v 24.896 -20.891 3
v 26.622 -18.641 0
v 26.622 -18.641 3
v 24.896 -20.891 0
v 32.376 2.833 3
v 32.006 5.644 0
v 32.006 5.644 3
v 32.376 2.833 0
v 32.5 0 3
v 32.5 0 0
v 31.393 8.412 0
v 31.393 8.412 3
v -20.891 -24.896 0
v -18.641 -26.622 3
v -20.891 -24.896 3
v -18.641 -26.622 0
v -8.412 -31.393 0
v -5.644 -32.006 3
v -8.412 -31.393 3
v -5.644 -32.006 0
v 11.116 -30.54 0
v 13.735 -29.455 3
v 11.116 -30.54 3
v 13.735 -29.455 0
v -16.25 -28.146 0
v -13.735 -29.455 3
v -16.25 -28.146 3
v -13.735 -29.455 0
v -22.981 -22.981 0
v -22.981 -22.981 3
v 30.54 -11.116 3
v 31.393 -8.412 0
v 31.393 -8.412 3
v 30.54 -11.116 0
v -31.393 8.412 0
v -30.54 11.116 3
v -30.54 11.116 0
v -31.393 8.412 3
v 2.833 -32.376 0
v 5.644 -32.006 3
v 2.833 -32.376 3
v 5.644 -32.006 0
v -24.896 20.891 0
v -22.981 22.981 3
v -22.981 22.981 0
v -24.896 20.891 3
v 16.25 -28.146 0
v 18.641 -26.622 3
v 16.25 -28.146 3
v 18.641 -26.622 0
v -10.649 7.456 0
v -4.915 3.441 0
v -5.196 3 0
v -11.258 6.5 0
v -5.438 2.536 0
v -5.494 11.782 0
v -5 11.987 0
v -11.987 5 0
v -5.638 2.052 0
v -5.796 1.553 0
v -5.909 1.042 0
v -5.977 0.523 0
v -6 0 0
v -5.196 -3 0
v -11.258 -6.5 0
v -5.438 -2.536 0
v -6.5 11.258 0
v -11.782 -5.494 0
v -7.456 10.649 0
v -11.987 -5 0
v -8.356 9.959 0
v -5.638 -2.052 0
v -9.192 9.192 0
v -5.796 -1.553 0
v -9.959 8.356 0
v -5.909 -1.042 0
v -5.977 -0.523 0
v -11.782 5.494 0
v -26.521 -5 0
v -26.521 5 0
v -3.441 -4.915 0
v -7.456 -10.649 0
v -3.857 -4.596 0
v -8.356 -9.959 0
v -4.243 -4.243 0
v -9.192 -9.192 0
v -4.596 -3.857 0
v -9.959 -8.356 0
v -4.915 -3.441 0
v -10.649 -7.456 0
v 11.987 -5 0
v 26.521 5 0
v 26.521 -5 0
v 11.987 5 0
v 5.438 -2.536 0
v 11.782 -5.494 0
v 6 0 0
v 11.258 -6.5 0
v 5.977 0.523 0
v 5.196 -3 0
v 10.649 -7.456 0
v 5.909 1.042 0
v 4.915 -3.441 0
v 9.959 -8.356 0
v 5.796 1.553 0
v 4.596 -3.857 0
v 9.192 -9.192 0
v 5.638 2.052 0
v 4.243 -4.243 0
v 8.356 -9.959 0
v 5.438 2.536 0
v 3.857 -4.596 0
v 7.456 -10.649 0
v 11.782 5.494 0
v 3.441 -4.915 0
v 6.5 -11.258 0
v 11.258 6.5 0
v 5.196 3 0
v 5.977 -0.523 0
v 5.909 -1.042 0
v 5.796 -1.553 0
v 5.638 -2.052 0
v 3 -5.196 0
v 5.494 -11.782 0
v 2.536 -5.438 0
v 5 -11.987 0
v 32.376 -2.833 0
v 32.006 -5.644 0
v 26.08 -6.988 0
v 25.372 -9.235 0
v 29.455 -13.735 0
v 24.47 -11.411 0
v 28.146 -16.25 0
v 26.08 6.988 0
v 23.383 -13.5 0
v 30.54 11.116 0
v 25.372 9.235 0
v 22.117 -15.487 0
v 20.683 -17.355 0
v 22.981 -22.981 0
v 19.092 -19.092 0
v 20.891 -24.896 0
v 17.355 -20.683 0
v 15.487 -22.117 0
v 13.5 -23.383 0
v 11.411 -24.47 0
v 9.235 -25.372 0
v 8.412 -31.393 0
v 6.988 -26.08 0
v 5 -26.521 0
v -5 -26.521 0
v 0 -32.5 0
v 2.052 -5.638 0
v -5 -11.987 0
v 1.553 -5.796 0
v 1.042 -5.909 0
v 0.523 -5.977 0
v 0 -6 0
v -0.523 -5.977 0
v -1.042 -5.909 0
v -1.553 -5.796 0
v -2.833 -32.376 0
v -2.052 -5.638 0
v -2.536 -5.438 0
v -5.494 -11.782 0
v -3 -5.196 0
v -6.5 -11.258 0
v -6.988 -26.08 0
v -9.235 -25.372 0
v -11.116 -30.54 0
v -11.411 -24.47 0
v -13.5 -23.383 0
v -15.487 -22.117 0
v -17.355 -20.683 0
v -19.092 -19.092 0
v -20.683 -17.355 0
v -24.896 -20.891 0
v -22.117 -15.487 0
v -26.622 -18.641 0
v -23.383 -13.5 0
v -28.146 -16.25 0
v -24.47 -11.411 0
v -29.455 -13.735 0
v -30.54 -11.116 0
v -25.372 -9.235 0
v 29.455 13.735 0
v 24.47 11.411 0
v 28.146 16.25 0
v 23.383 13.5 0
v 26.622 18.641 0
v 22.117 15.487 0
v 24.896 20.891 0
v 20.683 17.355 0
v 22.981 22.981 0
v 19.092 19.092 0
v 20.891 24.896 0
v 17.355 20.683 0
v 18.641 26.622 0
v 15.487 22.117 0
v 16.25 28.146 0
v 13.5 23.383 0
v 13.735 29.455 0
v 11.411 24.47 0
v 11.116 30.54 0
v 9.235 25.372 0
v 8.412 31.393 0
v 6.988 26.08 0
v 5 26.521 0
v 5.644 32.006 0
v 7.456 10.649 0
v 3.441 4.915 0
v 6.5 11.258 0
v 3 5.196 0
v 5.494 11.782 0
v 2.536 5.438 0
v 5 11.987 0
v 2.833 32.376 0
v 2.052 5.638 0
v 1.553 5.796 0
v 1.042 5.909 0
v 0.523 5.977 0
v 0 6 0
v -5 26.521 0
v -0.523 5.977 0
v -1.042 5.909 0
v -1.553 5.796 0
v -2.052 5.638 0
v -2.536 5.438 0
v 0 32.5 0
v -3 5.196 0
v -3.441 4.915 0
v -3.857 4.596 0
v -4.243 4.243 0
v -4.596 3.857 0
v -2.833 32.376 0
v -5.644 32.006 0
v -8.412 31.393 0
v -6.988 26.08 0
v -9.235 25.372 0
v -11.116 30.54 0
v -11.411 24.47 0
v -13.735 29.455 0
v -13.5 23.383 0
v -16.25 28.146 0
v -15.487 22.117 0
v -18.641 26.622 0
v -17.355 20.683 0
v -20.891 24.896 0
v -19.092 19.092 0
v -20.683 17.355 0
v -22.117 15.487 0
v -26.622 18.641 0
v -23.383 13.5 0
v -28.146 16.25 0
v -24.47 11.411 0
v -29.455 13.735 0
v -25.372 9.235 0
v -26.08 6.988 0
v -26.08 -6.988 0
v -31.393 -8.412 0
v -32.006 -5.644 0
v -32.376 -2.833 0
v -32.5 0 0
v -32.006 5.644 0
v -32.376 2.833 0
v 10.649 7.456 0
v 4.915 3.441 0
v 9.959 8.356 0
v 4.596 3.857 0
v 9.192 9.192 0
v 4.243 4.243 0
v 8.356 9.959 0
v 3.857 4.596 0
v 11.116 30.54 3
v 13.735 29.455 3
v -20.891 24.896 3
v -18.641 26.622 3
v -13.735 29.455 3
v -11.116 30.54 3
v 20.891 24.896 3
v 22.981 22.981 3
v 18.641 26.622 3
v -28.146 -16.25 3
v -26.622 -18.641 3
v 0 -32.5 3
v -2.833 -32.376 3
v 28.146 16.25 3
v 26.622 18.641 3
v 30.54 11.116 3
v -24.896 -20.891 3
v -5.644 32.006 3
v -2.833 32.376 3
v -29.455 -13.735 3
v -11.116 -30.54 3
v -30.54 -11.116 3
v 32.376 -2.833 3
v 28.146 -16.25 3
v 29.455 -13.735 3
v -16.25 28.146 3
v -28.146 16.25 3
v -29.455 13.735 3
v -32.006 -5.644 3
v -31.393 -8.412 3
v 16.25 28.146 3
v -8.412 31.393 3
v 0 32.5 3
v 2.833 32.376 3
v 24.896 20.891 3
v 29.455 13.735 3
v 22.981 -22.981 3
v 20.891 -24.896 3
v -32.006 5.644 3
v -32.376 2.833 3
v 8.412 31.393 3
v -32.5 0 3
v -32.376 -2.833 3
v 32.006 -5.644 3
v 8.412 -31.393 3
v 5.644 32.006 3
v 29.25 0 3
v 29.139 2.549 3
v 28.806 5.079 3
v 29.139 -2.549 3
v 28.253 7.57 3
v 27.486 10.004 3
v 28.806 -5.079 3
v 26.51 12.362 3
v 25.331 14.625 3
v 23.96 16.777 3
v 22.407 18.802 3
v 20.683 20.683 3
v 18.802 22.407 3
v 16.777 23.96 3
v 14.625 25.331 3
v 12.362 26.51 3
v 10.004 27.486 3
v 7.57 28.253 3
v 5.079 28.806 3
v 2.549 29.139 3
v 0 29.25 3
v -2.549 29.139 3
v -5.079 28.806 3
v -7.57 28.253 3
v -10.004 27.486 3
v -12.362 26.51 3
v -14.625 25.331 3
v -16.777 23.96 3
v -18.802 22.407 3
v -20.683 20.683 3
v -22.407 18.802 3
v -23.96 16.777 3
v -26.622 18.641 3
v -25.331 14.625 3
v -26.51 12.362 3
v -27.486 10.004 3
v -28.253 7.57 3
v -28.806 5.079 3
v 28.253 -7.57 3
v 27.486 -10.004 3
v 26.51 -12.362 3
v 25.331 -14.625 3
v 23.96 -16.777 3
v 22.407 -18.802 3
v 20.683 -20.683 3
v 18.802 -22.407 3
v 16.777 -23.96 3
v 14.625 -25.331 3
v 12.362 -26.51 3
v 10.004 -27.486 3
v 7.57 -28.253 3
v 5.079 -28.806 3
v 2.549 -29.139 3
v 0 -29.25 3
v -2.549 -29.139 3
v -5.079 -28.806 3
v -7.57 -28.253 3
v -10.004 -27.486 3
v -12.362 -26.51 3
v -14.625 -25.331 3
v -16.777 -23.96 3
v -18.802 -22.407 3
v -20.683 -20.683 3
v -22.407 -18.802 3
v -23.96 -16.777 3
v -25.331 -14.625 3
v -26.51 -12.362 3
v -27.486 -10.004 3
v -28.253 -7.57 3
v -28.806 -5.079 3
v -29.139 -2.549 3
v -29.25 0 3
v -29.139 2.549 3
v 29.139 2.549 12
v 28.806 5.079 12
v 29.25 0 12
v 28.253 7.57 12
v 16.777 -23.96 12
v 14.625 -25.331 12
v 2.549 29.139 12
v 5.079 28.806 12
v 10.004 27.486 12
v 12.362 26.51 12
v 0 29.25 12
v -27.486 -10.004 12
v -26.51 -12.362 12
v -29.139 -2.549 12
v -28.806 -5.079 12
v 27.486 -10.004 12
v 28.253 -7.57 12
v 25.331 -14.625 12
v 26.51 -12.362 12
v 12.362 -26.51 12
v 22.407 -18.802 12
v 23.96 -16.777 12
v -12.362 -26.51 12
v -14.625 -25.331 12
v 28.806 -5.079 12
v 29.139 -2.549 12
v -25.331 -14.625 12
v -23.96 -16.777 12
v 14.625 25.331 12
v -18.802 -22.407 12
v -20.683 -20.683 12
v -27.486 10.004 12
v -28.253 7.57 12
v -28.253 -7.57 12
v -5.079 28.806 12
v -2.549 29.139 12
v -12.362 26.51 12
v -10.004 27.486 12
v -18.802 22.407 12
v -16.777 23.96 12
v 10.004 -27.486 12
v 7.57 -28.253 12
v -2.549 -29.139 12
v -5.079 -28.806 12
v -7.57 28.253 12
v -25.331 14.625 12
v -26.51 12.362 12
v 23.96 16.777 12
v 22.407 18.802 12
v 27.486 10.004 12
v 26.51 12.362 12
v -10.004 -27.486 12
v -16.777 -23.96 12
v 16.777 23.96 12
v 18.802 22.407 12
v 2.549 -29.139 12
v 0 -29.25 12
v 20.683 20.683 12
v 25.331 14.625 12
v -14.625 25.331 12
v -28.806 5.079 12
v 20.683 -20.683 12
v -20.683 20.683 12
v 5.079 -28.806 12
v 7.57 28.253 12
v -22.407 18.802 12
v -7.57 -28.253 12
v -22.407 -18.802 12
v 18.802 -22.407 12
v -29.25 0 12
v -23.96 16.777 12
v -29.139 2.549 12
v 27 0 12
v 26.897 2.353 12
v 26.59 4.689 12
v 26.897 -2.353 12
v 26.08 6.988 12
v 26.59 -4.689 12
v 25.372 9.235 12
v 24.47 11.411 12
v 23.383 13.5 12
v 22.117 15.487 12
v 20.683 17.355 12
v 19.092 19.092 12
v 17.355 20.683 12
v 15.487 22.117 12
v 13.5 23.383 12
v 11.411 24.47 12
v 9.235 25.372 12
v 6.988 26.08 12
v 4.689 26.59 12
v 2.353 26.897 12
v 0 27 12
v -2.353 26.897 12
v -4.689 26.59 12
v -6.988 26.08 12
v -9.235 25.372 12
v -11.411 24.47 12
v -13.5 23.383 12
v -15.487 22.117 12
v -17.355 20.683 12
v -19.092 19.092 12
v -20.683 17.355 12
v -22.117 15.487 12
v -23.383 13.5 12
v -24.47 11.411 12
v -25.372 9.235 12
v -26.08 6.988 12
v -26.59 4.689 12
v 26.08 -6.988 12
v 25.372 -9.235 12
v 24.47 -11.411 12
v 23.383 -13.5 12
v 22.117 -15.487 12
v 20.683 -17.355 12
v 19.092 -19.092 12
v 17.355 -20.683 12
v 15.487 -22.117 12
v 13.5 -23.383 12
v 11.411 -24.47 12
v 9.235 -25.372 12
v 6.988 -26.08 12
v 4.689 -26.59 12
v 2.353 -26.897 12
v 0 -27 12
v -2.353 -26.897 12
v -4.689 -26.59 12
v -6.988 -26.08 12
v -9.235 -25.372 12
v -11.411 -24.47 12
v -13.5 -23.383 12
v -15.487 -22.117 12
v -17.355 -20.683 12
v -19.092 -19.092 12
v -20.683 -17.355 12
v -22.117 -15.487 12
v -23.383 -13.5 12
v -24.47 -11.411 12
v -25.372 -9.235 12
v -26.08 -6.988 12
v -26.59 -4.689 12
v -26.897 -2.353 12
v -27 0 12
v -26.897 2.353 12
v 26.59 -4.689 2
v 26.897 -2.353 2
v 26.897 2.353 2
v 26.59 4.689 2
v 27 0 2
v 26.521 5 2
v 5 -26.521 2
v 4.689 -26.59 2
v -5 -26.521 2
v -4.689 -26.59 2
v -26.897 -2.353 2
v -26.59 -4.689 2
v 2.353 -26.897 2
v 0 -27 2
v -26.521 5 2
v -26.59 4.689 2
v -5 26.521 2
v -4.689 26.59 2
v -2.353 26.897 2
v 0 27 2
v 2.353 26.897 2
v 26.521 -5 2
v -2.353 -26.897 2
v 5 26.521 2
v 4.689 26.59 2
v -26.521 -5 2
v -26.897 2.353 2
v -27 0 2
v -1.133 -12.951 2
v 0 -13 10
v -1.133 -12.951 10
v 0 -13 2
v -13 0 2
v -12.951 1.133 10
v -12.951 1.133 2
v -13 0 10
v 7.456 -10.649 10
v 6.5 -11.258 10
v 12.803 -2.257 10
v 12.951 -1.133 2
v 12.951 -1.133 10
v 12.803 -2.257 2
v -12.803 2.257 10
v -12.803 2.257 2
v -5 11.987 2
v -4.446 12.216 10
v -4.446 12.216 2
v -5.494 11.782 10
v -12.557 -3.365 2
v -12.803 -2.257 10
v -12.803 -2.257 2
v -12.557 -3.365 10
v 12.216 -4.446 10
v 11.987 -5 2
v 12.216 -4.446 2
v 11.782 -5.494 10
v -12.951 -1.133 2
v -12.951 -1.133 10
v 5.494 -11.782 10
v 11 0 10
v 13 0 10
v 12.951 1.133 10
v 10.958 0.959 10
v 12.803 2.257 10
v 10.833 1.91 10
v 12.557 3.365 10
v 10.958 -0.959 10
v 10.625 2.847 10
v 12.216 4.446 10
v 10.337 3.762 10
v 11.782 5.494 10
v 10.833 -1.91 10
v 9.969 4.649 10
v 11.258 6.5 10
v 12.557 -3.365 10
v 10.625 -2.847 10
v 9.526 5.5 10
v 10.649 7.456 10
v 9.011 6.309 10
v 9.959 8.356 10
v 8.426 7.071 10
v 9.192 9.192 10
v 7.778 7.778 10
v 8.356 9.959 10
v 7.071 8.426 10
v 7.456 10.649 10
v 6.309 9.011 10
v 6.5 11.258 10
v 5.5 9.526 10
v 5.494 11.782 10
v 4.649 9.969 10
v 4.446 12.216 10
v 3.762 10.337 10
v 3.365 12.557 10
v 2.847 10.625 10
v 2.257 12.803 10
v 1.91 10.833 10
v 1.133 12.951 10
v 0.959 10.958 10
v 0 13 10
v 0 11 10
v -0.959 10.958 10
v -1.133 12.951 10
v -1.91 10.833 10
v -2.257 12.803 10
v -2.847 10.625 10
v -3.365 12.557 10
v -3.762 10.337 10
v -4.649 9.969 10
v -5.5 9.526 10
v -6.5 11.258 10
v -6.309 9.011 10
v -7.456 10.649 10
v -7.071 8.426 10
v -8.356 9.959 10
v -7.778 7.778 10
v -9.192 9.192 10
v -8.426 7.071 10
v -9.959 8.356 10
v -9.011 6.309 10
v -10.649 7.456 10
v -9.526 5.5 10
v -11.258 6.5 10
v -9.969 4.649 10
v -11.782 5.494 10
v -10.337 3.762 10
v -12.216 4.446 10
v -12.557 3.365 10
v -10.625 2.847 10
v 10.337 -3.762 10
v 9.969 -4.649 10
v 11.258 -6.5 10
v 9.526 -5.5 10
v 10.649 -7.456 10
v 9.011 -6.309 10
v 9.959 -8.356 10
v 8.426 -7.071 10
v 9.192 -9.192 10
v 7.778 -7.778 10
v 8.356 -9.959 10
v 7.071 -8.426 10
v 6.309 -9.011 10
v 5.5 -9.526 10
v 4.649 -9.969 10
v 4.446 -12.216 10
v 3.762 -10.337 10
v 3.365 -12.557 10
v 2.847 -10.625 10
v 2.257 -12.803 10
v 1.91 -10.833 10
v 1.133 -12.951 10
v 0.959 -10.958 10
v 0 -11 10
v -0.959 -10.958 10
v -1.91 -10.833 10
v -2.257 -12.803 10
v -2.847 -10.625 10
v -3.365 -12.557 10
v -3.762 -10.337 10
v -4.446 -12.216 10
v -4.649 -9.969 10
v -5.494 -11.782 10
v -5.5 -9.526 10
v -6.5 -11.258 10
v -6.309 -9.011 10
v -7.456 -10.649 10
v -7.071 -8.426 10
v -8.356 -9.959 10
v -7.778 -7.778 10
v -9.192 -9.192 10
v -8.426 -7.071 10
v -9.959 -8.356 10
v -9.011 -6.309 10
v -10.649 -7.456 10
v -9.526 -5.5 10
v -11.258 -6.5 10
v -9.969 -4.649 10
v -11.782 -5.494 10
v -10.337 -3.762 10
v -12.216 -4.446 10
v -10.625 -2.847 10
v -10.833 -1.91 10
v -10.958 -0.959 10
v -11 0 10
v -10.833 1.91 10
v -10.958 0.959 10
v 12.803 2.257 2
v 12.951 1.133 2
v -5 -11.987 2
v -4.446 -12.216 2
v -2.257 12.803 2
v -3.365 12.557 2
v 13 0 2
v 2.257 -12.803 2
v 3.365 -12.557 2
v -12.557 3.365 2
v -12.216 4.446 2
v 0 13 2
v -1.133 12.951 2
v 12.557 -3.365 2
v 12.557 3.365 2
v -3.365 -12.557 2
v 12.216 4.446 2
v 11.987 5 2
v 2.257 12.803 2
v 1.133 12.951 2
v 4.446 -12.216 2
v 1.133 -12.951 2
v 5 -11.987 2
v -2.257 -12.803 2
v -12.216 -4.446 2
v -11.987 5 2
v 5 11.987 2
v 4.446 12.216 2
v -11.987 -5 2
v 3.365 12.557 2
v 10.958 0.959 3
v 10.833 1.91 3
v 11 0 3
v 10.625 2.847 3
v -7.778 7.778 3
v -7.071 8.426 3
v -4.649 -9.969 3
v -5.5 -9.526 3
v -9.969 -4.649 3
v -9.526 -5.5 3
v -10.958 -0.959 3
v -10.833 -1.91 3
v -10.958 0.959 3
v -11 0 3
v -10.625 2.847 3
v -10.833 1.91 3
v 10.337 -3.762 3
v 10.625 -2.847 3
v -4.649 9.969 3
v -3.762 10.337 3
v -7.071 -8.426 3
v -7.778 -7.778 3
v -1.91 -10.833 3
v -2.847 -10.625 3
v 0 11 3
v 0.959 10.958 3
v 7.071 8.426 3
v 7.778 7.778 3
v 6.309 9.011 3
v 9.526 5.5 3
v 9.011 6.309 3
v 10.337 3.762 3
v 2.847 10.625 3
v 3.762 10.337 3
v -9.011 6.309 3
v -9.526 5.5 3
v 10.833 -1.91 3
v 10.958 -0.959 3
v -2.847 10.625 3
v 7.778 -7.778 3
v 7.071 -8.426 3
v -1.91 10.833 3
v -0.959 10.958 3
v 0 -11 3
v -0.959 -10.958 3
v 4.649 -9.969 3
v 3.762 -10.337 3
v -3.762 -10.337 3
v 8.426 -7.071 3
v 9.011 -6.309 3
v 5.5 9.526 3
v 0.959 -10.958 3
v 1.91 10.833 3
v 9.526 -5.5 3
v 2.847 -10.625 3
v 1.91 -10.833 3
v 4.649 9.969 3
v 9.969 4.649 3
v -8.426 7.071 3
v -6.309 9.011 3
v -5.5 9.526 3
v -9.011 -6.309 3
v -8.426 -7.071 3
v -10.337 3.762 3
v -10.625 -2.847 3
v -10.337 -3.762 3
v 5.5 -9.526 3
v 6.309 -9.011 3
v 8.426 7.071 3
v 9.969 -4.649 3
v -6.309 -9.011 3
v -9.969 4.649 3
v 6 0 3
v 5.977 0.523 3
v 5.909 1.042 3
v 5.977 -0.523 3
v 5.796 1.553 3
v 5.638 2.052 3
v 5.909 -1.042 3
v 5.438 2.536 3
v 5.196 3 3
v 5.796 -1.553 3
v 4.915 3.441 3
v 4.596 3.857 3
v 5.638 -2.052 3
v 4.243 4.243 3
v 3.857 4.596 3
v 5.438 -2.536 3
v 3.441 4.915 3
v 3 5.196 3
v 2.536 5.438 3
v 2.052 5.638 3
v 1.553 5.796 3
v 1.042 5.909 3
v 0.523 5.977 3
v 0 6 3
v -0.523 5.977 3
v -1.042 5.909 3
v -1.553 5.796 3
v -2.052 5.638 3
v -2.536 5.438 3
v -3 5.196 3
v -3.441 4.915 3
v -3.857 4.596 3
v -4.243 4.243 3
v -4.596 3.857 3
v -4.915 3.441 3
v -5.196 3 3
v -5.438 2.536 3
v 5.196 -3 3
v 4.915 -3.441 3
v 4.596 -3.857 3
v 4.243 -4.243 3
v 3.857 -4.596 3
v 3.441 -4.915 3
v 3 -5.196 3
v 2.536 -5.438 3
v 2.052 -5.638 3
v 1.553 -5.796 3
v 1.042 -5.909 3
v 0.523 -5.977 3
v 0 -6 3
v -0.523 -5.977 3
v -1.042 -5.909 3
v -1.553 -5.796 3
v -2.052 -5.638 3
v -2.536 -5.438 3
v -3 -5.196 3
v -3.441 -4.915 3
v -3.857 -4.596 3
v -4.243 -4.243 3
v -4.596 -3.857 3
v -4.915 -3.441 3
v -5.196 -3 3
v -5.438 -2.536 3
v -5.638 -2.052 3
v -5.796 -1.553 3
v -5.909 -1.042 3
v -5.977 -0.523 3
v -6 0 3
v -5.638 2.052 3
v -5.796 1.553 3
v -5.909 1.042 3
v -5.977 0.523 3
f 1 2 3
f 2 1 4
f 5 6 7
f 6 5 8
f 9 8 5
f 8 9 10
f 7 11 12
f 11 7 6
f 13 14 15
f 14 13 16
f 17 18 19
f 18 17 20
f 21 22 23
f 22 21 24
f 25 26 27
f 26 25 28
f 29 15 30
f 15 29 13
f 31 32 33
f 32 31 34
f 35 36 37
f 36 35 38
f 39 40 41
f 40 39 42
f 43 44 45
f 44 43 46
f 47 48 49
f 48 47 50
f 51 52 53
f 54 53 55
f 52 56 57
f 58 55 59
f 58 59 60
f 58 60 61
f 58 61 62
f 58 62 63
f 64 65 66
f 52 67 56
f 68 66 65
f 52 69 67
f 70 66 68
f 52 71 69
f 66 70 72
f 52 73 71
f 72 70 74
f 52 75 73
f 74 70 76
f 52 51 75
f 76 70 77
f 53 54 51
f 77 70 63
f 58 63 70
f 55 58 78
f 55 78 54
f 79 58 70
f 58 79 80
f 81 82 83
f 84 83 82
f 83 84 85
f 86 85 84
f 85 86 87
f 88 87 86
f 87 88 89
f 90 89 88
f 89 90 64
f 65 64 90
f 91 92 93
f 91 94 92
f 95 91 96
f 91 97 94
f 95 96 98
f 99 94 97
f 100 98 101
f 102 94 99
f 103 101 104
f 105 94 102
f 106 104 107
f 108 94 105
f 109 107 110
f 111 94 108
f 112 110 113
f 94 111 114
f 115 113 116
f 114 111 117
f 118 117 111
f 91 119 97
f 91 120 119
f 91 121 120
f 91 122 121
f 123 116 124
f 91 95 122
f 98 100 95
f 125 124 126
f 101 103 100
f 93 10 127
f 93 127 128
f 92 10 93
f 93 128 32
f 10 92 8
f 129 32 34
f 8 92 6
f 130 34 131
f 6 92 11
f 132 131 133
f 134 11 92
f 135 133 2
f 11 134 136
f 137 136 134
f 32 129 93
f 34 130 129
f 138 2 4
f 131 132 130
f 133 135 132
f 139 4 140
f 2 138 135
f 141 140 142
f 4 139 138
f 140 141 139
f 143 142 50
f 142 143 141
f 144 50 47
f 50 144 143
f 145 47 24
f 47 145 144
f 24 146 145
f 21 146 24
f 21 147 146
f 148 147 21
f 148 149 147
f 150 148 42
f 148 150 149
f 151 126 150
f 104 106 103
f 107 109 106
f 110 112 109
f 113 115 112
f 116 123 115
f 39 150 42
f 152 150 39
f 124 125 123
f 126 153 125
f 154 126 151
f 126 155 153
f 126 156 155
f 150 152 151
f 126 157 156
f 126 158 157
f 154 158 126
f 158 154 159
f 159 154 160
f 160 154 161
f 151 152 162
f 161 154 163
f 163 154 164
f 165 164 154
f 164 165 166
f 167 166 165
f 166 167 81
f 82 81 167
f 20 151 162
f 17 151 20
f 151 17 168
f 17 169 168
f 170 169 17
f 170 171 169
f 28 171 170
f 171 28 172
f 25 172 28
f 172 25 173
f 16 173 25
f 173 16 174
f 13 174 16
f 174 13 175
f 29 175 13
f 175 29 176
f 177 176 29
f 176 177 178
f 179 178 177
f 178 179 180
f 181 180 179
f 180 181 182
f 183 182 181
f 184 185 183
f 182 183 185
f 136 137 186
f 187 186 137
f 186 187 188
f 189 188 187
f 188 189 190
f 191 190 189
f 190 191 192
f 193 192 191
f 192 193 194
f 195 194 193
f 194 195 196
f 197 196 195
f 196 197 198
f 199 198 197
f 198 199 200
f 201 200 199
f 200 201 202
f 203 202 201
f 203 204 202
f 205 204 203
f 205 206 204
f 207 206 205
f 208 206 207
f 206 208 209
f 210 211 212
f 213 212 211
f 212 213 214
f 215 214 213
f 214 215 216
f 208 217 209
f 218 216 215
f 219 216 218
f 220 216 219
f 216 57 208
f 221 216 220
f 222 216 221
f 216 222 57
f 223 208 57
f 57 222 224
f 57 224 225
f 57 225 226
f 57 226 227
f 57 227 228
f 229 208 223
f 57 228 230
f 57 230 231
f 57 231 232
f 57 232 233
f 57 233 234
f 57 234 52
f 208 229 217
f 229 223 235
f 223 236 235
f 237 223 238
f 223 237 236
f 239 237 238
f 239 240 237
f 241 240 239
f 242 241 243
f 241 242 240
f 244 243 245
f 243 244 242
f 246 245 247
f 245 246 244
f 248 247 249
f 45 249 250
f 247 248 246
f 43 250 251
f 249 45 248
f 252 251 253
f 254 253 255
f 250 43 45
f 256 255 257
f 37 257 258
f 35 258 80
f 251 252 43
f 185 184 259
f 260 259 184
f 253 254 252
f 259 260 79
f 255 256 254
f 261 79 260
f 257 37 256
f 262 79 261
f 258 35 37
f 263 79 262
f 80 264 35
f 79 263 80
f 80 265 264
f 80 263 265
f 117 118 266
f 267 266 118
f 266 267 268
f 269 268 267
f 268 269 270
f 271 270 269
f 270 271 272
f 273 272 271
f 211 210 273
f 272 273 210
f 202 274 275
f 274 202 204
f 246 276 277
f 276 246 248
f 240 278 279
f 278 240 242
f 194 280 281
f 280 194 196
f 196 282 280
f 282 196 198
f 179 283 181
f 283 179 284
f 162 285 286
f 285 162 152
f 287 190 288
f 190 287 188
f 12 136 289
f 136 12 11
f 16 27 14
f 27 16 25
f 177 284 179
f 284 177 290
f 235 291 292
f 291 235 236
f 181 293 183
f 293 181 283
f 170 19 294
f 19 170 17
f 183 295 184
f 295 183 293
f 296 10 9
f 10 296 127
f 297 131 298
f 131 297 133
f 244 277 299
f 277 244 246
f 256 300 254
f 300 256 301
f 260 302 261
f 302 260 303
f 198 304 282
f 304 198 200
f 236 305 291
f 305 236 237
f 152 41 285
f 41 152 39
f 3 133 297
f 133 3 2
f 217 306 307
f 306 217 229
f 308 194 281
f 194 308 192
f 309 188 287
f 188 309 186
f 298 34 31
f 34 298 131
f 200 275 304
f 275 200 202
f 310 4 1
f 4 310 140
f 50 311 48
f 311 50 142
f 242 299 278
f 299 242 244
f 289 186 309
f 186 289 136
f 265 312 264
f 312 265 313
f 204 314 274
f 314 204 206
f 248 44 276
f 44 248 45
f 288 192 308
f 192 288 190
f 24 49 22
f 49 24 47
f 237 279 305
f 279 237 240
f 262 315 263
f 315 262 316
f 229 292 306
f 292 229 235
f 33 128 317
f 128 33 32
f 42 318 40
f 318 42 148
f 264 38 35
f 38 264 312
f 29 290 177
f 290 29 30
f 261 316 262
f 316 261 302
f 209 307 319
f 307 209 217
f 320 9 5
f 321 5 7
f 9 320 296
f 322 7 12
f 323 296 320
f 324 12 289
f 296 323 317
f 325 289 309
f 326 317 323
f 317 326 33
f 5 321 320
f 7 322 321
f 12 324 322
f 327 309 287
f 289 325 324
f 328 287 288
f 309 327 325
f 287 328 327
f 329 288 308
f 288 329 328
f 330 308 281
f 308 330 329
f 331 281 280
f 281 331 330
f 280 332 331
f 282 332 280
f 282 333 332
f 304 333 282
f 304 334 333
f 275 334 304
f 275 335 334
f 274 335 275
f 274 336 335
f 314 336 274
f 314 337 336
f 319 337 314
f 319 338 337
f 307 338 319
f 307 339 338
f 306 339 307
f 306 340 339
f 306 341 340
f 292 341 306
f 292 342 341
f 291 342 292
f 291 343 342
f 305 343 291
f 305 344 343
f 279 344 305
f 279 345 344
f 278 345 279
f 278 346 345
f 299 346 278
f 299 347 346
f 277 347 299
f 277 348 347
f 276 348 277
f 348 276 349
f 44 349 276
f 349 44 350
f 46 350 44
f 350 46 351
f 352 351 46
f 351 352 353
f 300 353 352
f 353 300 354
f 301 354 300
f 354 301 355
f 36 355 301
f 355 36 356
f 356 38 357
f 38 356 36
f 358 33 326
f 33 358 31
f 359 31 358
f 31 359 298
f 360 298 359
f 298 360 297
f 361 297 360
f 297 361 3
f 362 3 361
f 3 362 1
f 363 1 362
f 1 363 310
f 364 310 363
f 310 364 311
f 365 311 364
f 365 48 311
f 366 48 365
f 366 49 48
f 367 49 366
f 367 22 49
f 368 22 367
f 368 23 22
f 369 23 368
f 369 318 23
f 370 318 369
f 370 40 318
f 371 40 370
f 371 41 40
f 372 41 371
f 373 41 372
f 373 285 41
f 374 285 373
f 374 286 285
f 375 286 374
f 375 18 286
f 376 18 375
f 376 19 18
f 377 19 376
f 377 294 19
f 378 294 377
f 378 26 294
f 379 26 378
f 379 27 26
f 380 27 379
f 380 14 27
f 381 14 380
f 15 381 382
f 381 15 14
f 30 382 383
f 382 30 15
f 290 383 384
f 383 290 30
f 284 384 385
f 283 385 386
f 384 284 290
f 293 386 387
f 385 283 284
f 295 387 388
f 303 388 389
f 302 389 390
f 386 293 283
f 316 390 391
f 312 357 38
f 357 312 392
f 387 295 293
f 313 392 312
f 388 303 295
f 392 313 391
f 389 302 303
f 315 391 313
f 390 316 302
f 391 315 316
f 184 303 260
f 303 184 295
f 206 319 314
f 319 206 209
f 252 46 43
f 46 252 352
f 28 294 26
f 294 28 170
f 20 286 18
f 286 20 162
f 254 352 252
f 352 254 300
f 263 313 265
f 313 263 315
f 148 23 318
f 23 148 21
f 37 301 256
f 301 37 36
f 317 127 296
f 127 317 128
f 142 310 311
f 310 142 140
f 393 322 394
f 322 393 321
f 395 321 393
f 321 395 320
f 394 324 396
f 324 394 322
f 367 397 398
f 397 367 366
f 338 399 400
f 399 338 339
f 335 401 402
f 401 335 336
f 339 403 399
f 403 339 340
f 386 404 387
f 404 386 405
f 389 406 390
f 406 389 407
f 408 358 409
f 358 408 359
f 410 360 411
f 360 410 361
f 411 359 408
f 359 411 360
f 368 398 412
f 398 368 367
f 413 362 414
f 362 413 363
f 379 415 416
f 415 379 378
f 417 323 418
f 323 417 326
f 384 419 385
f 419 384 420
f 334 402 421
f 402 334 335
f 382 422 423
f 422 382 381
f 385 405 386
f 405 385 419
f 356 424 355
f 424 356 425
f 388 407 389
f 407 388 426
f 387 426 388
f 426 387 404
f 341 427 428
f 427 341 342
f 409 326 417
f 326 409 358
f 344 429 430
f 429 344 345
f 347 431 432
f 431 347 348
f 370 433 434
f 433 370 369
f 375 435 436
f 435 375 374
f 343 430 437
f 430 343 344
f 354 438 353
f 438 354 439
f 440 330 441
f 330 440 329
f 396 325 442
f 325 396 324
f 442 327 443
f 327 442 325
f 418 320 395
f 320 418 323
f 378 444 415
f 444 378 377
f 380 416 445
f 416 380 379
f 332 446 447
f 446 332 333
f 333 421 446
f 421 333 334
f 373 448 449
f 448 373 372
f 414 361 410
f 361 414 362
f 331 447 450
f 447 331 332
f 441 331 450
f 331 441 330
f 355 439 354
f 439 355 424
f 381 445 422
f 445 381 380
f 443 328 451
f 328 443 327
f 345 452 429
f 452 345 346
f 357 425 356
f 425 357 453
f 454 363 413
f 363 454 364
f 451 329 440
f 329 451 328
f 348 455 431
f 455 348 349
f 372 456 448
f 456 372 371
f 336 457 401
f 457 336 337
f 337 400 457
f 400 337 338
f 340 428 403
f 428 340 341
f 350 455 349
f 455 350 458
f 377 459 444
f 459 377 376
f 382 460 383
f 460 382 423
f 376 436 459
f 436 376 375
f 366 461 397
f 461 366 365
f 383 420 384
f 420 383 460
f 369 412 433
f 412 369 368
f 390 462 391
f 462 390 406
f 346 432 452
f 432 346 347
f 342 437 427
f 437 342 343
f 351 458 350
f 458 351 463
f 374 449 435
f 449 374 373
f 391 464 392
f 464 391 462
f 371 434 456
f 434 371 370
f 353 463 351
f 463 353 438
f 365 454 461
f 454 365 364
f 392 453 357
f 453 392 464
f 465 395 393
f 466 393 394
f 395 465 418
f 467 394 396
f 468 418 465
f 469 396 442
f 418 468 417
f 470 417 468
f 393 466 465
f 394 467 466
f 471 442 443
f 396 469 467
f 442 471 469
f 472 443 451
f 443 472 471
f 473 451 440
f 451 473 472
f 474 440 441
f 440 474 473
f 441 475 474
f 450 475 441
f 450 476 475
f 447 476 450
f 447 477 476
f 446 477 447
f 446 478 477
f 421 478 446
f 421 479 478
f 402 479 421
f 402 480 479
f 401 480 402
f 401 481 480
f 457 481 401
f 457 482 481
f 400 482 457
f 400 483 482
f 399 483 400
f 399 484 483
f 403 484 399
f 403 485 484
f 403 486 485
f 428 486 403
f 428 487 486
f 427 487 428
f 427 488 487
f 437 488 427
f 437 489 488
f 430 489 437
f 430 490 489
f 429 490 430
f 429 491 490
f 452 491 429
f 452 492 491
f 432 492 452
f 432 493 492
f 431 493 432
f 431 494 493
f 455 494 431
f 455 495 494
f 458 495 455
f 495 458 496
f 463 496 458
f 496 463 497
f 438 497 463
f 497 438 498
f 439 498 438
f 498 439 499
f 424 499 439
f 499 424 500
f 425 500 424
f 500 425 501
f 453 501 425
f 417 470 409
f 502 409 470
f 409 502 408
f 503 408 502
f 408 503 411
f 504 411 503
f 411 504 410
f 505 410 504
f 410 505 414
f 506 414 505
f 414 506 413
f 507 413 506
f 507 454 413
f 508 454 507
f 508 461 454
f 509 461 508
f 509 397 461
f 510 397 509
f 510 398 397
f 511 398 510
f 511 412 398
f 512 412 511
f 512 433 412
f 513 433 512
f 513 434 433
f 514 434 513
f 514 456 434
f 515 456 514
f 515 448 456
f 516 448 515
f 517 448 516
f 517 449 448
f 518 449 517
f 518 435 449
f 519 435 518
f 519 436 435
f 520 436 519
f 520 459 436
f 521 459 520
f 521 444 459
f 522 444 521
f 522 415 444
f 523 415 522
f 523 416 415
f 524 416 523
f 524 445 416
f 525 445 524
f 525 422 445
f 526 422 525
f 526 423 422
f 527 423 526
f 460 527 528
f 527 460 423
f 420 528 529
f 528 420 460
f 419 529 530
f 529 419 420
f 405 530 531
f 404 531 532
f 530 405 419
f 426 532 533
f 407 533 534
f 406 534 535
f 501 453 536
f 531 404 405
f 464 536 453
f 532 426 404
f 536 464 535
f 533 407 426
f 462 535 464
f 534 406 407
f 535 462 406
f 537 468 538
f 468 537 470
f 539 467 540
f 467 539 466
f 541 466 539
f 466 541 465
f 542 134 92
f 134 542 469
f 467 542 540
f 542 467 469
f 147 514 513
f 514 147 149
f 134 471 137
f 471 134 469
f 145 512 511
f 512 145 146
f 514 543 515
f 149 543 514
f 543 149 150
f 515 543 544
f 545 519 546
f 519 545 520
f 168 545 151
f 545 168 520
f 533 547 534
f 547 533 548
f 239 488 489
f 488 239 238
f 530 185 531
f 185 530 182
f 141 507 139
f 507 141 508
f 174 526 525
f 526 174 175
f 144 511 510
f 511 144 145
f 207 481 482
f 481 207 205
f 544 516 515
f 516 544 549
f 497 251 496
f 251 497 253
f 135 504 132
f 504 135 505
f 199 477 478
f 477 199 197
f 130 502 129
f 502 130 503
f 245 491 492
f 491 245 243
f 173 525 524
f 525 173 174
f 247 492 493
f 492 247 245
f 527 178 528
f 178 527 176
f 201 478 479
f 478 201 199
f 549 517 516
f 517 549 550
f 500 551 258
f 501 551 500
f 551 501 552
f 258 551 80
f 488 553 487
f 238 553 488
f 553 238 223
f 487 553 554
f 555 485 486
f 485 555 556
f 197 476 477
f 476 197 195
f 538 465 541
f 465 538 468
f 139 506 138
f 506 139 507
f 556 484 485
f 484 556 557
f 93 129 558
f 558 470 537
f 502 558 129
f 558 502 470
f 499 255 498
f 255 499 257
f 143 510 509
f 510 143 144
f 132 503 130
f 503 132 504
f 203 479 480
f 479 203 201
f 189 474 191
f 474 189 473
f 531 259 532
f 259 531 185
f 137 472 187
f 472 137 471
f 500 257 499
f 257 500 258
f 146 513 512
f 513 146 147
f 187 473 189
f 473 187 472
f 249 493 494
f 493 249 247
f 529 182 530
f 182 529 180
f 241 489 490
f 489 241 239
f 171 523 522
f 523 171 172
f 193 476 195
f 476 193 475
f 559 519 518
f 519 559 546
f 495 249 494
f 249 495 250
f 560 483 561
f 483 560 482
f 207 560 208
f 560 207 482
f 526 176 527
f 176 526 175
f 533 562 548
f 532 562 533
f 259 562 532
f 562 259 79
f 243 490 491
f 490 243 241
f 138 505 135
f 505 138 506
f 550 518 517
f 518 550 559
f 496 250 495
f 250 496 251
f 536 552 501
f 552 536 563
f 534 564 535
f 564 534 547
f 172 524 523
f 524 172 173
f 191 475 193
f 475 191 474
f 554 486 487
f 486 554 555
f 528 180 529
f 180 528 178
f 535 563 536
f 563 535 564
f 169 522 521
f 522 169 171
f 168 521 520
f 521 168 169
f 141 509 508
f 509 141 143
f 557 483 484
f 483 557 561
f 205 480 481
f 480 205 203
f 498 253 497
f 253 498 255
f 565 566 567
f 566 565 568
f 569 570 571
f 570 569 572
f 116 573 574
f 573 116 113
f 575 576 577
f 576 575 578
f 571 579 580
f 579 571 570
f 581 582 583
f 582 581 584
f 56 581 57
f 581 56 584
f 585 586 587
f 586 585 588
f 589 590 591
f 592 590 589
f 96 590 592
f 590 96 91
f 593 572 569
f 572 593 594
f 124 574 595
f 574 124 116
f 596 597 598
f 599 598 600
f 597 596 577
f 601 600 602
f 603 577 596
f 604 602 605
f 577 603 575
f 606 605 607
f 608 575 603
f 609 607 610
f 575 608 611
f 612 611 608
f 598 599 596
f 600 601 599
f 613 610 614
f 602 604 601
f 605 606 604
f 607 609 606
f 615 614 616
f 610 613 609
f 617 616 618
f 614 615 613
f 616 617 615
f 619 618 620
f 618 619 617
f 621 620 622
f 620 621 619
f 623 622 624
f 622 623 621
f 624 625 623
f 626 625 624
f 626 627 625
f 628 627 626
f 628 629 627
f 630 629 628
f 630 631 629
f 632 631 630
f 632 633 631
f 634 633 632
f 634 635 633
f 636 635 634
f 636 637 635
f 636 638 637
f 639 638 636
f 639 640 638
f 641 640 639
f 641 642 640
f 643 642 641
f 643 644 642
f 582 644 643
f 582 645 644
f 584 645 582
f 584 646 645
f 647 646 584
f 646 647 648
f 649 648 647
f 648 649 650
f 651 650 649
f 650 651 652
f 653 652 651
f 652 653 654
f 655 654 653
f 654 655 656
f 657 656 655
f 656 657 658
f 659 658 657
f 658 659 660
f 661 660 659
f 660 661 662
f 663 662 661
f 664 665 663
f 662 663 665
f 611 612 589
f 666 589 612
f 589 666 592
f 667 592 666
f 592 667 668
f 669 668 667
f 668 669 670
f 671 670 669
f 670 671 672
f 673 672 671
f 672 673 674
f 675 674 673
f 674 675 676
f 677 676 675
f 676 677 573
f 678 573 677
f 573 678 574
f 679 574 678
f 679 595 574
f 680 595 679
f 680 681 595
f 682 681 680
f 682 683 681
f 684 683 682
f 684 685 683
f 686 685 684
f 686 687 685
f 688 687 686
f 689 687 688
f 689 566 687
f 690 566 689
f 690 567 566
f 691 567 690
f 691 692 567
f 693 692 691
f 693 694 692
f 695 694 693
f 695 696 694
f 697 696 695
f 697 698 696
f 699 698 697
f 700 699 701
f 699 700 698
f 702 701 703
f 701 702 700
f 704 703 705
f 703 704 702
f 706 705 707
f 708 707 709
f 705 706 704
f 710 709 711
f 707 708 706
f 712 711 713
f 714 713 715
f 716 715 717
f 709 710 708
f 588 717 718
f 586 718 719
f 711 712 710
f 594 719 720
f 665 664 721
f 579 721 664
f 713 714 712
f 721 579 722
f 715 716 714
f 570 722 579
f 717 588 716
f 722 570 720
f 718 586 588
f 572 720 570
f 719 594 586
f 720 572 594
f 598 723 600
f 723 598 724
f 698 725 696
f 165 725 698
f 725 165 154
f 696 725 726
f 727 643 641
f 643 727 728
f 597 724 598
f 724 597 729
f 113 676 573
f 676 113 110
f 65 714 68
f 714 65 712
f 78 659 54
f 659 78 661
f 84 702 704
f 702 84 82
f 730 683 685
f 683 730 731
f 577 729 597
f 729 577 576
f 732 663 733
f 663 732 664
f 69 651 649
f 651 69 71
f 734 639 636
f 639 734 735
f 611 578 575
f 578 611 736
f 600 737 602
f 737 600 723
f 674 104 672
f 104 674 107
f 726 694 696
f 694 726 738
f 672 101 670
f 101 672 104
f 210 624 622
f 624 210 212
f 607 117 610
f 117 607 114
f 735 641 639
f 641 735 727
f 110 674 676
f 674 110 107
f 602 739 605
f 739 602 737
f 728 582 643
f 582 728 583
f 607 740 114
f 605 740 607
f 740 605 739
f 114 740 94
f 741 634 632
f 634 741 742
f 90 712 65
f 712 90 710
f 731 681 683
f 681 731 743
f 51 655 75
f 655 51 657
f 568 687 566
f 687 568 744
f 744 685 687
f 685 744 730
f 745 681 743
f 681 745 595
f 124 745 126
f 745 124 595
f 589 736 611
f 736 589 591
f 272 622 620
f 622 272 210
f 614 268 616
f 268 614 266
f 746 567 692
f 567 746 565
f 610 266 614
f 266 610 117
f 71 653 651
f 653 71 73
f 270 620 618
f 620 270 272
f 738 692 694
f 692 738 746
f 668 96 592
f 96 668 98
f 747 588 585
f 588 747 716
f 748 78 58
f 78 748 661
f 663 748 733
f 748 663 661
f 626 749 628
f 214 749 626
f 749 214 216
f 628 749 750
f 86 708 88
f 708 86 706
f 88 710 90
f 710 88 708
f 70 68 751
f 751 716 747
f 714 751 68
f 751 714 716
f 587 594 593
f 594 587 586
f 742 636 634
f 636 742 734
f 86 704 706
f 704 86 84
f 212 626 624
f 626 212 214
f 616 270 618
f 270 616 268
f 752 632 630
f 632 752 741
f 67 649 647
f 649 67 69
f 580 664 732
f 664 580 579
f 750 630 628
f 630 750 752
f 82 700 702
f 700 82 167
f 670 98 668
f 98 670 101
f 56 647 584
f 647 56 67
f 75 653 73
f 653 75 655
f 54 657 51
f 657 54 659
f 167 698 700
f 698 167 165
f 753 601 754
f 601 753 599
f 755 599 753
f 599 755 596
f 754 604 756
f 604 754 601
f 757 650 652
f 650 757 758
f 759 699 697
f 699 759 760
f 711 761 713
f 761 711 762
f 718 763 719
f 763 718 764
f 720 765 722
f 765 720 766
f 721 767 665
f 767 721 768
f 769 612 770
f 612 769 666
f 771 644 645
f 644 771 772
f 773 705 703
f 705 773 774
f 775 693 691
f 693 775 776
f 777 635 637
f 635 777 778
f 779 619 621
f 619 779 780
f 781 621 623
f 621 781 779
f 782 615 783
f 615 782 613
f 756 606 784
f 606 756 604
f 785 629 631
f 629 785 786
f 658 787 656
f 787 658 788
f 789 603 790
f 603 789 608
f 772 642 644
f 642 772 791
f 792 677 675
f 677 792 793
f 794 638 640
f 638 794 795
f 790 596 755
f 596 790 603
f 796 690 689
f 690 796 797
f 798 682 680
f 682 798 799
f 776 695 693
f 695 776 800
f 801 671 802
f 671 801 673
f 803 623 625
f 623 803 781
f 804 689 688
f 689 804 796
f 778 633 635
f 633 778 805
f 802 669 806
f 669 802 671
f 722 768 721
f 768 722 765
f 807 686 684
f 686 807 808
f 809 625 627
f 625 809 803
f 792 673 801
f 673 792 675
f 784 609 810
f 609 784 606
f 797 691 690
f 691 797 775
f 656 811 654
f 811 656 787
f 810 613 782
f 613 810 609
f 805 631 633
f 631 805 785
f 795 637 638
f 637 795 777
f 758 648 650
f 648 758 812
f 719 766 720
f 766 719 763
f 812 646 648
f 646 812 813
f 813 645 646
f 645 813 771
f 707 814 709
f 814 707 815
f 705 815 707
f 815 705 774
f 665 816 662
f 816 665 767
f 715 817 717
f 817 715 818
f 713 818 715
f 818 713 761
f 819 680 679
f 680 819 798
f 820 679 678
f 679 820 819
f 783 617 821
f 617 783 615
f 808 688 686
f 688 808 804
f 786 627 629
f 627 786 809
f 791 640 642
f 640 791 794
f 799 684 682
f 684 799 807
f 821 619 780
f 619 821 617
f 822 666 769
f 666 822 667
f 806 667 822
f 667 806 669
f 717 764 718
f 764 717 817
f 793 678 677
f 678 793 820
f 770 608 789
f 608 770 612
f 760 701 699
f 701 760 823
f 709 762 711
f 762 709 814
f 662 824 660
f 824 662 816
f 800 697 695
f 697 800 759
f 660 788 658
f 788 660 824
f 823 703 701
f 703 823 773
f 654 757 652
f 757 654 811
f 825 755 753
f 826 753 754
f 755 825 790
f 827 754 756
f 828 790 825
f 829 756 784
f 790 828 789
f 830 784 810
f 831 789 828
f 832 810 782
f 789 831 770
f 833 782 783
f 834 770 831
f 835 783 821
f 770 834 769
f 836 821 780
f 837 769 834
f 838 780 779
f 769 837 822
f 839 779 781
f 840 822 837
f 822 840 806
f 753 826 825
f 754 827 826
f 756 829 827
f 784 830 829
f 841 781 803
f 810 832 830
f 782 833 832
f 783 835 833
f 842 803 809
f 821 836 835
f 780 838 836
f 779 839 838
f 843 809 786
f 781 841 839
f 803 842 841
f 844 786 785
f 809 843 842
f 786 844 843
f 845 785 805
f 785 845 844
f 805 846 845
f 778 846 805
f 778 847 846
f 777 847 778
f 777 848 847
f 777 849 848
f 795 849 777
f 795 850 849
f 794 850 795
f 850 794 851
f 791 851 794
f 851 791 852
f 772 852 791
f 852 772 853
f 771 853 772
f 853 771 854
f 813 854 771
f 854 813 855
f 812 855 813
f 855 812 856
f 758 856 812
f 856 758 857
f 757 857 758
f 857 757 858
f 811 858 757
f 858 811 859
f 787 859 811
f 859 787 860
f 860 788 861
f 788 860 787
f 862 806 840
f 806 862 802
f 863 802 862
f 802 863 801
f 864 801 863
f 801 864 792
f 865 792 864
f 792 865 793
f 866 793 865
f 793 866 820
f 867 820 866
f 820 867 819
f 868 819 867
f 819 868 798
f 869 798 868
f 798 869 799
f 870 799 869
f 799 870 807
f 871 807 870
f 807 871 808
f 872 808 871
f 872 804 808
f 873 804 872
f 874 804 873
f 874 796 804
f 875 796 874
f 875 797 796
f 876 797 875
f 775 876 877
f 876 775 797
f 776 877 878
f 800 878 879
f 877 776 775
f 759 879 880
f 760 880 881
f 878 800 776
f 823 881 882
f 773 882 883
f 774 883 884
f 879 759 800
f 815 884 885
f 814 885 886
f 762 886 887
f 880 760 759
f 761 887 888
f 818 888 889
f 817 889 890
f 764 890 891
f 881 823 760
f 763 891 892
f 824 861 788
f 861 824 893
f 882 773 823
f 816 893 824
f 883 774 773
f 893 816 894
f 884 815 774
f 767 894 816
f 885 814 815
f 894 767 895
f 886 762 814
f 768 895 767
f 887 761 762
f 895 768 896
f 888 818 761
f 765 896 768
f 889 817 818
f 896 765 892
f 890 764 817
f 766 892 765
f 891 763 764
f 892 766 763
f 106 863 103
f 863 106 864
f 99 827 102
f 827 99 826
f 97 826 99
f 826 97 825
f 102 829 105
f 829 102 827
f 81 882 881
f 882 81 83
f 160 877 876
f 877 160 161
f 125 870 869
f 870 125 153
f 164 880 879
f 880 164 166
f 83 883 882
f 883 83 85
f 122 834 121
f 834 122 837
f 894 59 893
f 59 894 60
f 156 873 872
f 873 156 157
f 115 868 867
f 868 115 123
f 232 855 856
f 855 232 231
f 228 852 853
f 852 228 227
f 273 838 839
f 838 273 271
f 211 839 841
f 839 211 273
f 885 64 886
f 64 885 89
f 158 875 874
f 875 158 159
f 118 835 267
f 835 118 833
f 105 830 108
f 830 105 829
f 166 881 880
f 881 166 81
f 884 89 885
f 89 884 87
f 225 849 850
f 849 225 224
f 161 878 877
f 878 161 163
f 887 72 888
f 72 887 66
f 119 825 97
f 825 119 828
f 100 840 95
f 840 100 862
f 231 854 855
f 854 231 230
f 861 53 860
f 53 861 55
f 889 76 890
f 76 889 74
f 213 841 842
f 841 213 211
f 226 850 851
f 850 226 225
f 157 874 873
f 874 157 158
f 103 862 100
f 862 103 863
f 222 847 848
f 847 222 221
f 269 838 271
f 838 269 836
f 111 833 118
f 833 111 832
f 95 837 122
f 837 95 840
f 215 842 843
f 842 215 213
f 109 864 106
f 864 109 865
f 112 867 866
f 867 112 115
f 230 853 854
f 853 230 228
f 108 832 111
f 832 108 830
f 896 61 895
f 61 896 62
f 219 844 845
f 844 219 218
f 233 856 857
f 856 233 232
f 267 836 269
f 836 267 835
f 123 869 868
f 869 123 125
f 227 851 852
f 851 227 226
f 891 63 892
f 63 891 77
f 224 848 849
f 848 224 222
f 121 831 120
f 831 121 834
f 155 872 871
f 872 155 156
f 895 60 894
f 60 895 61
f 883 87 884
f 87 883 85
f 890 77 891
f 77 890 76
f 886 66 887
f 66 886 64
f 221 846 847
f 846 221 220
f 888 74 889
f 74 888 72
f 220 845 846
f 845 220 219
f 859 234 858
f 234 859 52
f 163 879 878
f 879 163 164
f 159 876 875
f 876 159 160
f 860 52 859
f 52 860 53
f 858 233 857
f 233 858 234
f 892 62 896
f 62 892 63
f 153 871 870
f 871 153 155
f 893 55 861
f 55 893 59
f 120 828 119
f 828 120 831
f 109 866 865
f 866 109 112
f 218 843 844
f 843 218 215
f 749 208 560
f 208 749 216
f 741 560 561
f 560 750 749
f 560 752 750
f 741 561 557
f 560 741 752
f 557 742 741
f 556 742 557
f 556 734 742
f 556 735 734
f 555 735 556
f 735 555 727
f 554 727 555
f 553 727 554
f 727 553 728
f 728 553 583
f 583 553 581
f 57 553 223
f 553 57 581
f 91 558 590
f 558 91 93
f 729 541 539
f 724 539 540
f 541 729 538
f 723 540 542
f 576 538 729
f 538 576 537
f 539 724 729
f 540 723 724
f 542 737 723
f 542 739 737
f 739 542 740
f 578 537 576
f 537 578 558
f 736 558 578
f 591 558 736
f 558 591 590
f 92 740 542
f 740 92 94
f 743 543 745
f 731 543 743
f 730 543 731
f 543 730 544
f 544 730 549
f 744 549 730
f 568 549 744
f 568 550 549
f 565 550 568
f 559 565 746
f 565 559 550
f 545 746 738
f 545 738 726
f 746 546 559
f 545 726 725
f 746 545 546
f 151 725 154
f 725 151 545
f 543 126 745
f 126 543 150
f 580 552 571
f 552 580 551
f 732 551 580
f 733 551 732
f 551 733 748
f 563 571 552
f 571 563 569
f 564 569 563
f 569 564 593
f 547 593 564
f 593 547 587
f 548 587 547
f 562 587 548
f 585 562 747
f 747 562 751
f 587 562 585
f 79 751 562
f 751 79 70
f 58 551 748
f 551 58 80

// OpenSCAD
/* If you want to use the new customization features, then you need the newest development version of OpenSCAD which you can get on the website along with the standard version. 
    Enable Edit--Preferences--Features--customizer and then uncheck View--Hide customizer.*/

/* I tried to limit the size and fit options for the customizer to reasonable ranges but if you have come this far (i.e. opening the .scad file in a text editor ;)) you can change these values easily if you need to. The values in square brackets (for example [0:0.1:1]) create a step slider in the customizer and values are [lowest step value:step size:highest step value]. Experiment with the values until you are satisfied with the look and fit. You should be able to print it with the default values though. 
    The code is amply commented so it should be easy to understand and possibly reuse. Commenting the code helps you understand it and me to learn and memorize the OpenSCAD scene language.*/

// little info tab for thingiverse users
/* [More detailed info on parameters in .scad-file!] */
// (file can be opened with any text editor)
ok = false; // 

// here you can choose which parts to print. If you just want to test the fit of a single part (i.e. the bearing holder or the outer holder part) you can switch off the other parts of the brace
/* [Parts to print (chose single parts for fit testing)] */
// Print the brim (blue)? yes/no
brim_yn = true;
// Outer holder part (yellow)?
holder_outer_wall_yn = true;
// Bearing holder (orange)?
bearing_holder_yn = true;
// Struts (green)?
struts_yn = true;


/* The fit options are there for adjusting the fit of the brace on future prints. Your first print will tell you where you need adjustments, if any.*/
/* [Fit options] */
// Adjusting the press fit value will add tenths of a millimeter to the outside of the main brace wall so that it fits more tightly into the spool. Initially I printed it with 0.5 mm added (58.5mm diameter, current default setting) which was a pretty tight fit, almost too tight, so I added the option to reduce this if the brace does hardly fit into the spool when printed on your printer. I would recommend values between 0.2-0.5. Less and the brace would probably slide out too easily. The actual spool inside diameter is 58mm (to 59mm near the surface of the spool). The brace is designed to be a bit oversized so that it does not come off easily.
// Press fit (default: 0.5mm, added to outside of 'main wall', diameter inside spool is 58 mm, 59mm near the surface)
press_fit = 0.5; // [0:0.1:0.5]

// The next value adds material on the inside of the bearing holder to make the bearing fit more tightly. If you choose a value of 0.1mm you are taking away about 1/10 of the diameter of a bearing so values from 0.025 to 0.1 might be a good idea if the bearings fit too loosely (as did mine). I still have to test printing only the holder to see which settings are best. I'll update here with recommendations.
// Bearing fit snugness (default: 0mm, be careful with this or you might have to file a lot to fit the bearings in)
bearing_fit = 0; // [0:0.025:0.2]

/* [Size and Looks options] */
// Brim height (actual brim, not printing brim, default: 3 mm)
brim_h = 3; // [1:1:5]
// Brim width (default: 7 mm)
brim_w = 7; // [2:1:15]

// A thicker wall width adds material on the inside of the wall, not the outside. The outside size is fixed (plus press fit value from above). 4mm is probably enough, it might work with 3mm, 2 or 1 is probably to fragile.
// Brace wall width (default: 4mm)
wall_width = 4; // [1:1:10]

// recommended number of struts 3-5, 6 is probably overkill, four is working nicely for me, three is not tested yet but will probably work, so 3-4 for minimal material use and 5-6 for good looks
// Number of stabilization struts (default: 4)
struts = 4; // [3:1:6]
/* [Hidden] */
$fn=72; // number of facets the parts are composed of
wall=2;

// Adjusting Bearing chamfer will add a bevel to the inside of the bearing hole so that bearings slide in more easily 
// Bearing chamfer width (default: 0.2mm)
bchamfer_w = 0.2; // [0:0.1:0.5]

// Bearing chamfer height (default: 0.4mm)
bchamfer_h = 0.4; // [0:0.1:1]

// Adjusting outer wall chamfer will add a bevel to the outside of the brace wall to make it easier to fit
// Outer wall chamfer width in mm (default: 0.2)
ochamfer_w = 0.2; // [0:0.1:1]

// Outer wall chamfer height in mm (default: 0.5)
ochamfer_h = 0.5; // [0:0.1:5]

// the following two values are for quicker rendering. If you cut out a cylinder from another for example and they are exactly the same height, OpenSCAD has difficulties deciding if the end caps of the cylinders were actually cut or not (but ONLY in the fast preview). If you render it, it shows correctly. It takes more time to preview and render and the preview looks ugly. If you oversize the cutting cylinder (or object) a tiny bit on both sides, it results in a clean hole so to speak, in the quick preview as well as in the final render. In this case, I move the cutting object a tiny bit down (tdiff) and oversize it (by th, twice tdiff) so that the cutting object protrudes by 0.05 on the top and bottom side and results in a clean cut. Any value greater than or equal to 0.001 will do. The ones I chose are arbitrary, I just liked the numbers ;).
tdiff = [0,0,-0.05];
th=0.1;

// Colors
col_holder_outer_wall = "Yellow";
col_bearing_holder =([255/255, 185/255, 0/255]);
col_struts = "GreenYellow";
col_brim = "CornflowerBlue";

// protruding brim, keeps the brace from falling into the spool
module brim(){ 
    color(col_brim)
    difference(){
        cylinder(h=brim_h, d=58+brim_w);
        translate(tdiff) cylinder(h=brim_h+th, d=58+press_fit);
    }
};

// 'main' wall that fits into spool
module holder_outer_wall(){ 
    color(col_holder_outer_wall)
    difference(){
        cylinder(h=12, d=58+press_fit);
        translate(tdiff) cylinder(h=12.1+th, d=58-wall_width);
    }
};

// holder for ball bearing
module bearing_holder(){ 
    // outer wall of holder
    color(col_bearing_holder)
    difference(){ 
        cylinder(h=7+wall+1, d=22+2*wall);
        translate(tdiff) cylinder(h=7.1+wall+1+th, d=22-bearing_fit);
    }
    // bottom of holder w/ hole for easier removal of bearing
    color(col_bearing_holder)
    difference(){ 
        cylinder(h=wall+1, d=22+2*wall); 
        translate(tdiff) cylinder(h=wall+1+th, d=12);
    }
};

// stabilization struts, base model
module strut(){ 
    translate([0,19,wall/2]) cube([10,19,wall],true);
};
    
module struts(){ // adds number of struts as set in parameters
    rot_angle = 360 / struts;
    for (a=[0:1:struts-1]){ 
        color(col_struts)
        rotate([0,0,a*-rot_angle]) strut(); // using the previously defined base model here
    };
};
    
// the parts of the brace are defined first (and can be reused as needed) and only after they are defined I actually put them in the scene, see below. This is not necessary but I think it provides a more readable, logical and literally more modular scene code plus it puts the code for switching individual modules on and off in one place.

union(){
    // outer brim (blue) 
    if(brim_yn){ brim(); };
    // wall plus brim (yellow)
    if(holder_outer_wall_yn){ holder_outer_wall(); };
    // ball bearing holder (orange)
    if(bearing_holder_yn){ bearing_holder(); };
    // stabilization struts (green)
    if(struts_yn){ struts(); };
};
